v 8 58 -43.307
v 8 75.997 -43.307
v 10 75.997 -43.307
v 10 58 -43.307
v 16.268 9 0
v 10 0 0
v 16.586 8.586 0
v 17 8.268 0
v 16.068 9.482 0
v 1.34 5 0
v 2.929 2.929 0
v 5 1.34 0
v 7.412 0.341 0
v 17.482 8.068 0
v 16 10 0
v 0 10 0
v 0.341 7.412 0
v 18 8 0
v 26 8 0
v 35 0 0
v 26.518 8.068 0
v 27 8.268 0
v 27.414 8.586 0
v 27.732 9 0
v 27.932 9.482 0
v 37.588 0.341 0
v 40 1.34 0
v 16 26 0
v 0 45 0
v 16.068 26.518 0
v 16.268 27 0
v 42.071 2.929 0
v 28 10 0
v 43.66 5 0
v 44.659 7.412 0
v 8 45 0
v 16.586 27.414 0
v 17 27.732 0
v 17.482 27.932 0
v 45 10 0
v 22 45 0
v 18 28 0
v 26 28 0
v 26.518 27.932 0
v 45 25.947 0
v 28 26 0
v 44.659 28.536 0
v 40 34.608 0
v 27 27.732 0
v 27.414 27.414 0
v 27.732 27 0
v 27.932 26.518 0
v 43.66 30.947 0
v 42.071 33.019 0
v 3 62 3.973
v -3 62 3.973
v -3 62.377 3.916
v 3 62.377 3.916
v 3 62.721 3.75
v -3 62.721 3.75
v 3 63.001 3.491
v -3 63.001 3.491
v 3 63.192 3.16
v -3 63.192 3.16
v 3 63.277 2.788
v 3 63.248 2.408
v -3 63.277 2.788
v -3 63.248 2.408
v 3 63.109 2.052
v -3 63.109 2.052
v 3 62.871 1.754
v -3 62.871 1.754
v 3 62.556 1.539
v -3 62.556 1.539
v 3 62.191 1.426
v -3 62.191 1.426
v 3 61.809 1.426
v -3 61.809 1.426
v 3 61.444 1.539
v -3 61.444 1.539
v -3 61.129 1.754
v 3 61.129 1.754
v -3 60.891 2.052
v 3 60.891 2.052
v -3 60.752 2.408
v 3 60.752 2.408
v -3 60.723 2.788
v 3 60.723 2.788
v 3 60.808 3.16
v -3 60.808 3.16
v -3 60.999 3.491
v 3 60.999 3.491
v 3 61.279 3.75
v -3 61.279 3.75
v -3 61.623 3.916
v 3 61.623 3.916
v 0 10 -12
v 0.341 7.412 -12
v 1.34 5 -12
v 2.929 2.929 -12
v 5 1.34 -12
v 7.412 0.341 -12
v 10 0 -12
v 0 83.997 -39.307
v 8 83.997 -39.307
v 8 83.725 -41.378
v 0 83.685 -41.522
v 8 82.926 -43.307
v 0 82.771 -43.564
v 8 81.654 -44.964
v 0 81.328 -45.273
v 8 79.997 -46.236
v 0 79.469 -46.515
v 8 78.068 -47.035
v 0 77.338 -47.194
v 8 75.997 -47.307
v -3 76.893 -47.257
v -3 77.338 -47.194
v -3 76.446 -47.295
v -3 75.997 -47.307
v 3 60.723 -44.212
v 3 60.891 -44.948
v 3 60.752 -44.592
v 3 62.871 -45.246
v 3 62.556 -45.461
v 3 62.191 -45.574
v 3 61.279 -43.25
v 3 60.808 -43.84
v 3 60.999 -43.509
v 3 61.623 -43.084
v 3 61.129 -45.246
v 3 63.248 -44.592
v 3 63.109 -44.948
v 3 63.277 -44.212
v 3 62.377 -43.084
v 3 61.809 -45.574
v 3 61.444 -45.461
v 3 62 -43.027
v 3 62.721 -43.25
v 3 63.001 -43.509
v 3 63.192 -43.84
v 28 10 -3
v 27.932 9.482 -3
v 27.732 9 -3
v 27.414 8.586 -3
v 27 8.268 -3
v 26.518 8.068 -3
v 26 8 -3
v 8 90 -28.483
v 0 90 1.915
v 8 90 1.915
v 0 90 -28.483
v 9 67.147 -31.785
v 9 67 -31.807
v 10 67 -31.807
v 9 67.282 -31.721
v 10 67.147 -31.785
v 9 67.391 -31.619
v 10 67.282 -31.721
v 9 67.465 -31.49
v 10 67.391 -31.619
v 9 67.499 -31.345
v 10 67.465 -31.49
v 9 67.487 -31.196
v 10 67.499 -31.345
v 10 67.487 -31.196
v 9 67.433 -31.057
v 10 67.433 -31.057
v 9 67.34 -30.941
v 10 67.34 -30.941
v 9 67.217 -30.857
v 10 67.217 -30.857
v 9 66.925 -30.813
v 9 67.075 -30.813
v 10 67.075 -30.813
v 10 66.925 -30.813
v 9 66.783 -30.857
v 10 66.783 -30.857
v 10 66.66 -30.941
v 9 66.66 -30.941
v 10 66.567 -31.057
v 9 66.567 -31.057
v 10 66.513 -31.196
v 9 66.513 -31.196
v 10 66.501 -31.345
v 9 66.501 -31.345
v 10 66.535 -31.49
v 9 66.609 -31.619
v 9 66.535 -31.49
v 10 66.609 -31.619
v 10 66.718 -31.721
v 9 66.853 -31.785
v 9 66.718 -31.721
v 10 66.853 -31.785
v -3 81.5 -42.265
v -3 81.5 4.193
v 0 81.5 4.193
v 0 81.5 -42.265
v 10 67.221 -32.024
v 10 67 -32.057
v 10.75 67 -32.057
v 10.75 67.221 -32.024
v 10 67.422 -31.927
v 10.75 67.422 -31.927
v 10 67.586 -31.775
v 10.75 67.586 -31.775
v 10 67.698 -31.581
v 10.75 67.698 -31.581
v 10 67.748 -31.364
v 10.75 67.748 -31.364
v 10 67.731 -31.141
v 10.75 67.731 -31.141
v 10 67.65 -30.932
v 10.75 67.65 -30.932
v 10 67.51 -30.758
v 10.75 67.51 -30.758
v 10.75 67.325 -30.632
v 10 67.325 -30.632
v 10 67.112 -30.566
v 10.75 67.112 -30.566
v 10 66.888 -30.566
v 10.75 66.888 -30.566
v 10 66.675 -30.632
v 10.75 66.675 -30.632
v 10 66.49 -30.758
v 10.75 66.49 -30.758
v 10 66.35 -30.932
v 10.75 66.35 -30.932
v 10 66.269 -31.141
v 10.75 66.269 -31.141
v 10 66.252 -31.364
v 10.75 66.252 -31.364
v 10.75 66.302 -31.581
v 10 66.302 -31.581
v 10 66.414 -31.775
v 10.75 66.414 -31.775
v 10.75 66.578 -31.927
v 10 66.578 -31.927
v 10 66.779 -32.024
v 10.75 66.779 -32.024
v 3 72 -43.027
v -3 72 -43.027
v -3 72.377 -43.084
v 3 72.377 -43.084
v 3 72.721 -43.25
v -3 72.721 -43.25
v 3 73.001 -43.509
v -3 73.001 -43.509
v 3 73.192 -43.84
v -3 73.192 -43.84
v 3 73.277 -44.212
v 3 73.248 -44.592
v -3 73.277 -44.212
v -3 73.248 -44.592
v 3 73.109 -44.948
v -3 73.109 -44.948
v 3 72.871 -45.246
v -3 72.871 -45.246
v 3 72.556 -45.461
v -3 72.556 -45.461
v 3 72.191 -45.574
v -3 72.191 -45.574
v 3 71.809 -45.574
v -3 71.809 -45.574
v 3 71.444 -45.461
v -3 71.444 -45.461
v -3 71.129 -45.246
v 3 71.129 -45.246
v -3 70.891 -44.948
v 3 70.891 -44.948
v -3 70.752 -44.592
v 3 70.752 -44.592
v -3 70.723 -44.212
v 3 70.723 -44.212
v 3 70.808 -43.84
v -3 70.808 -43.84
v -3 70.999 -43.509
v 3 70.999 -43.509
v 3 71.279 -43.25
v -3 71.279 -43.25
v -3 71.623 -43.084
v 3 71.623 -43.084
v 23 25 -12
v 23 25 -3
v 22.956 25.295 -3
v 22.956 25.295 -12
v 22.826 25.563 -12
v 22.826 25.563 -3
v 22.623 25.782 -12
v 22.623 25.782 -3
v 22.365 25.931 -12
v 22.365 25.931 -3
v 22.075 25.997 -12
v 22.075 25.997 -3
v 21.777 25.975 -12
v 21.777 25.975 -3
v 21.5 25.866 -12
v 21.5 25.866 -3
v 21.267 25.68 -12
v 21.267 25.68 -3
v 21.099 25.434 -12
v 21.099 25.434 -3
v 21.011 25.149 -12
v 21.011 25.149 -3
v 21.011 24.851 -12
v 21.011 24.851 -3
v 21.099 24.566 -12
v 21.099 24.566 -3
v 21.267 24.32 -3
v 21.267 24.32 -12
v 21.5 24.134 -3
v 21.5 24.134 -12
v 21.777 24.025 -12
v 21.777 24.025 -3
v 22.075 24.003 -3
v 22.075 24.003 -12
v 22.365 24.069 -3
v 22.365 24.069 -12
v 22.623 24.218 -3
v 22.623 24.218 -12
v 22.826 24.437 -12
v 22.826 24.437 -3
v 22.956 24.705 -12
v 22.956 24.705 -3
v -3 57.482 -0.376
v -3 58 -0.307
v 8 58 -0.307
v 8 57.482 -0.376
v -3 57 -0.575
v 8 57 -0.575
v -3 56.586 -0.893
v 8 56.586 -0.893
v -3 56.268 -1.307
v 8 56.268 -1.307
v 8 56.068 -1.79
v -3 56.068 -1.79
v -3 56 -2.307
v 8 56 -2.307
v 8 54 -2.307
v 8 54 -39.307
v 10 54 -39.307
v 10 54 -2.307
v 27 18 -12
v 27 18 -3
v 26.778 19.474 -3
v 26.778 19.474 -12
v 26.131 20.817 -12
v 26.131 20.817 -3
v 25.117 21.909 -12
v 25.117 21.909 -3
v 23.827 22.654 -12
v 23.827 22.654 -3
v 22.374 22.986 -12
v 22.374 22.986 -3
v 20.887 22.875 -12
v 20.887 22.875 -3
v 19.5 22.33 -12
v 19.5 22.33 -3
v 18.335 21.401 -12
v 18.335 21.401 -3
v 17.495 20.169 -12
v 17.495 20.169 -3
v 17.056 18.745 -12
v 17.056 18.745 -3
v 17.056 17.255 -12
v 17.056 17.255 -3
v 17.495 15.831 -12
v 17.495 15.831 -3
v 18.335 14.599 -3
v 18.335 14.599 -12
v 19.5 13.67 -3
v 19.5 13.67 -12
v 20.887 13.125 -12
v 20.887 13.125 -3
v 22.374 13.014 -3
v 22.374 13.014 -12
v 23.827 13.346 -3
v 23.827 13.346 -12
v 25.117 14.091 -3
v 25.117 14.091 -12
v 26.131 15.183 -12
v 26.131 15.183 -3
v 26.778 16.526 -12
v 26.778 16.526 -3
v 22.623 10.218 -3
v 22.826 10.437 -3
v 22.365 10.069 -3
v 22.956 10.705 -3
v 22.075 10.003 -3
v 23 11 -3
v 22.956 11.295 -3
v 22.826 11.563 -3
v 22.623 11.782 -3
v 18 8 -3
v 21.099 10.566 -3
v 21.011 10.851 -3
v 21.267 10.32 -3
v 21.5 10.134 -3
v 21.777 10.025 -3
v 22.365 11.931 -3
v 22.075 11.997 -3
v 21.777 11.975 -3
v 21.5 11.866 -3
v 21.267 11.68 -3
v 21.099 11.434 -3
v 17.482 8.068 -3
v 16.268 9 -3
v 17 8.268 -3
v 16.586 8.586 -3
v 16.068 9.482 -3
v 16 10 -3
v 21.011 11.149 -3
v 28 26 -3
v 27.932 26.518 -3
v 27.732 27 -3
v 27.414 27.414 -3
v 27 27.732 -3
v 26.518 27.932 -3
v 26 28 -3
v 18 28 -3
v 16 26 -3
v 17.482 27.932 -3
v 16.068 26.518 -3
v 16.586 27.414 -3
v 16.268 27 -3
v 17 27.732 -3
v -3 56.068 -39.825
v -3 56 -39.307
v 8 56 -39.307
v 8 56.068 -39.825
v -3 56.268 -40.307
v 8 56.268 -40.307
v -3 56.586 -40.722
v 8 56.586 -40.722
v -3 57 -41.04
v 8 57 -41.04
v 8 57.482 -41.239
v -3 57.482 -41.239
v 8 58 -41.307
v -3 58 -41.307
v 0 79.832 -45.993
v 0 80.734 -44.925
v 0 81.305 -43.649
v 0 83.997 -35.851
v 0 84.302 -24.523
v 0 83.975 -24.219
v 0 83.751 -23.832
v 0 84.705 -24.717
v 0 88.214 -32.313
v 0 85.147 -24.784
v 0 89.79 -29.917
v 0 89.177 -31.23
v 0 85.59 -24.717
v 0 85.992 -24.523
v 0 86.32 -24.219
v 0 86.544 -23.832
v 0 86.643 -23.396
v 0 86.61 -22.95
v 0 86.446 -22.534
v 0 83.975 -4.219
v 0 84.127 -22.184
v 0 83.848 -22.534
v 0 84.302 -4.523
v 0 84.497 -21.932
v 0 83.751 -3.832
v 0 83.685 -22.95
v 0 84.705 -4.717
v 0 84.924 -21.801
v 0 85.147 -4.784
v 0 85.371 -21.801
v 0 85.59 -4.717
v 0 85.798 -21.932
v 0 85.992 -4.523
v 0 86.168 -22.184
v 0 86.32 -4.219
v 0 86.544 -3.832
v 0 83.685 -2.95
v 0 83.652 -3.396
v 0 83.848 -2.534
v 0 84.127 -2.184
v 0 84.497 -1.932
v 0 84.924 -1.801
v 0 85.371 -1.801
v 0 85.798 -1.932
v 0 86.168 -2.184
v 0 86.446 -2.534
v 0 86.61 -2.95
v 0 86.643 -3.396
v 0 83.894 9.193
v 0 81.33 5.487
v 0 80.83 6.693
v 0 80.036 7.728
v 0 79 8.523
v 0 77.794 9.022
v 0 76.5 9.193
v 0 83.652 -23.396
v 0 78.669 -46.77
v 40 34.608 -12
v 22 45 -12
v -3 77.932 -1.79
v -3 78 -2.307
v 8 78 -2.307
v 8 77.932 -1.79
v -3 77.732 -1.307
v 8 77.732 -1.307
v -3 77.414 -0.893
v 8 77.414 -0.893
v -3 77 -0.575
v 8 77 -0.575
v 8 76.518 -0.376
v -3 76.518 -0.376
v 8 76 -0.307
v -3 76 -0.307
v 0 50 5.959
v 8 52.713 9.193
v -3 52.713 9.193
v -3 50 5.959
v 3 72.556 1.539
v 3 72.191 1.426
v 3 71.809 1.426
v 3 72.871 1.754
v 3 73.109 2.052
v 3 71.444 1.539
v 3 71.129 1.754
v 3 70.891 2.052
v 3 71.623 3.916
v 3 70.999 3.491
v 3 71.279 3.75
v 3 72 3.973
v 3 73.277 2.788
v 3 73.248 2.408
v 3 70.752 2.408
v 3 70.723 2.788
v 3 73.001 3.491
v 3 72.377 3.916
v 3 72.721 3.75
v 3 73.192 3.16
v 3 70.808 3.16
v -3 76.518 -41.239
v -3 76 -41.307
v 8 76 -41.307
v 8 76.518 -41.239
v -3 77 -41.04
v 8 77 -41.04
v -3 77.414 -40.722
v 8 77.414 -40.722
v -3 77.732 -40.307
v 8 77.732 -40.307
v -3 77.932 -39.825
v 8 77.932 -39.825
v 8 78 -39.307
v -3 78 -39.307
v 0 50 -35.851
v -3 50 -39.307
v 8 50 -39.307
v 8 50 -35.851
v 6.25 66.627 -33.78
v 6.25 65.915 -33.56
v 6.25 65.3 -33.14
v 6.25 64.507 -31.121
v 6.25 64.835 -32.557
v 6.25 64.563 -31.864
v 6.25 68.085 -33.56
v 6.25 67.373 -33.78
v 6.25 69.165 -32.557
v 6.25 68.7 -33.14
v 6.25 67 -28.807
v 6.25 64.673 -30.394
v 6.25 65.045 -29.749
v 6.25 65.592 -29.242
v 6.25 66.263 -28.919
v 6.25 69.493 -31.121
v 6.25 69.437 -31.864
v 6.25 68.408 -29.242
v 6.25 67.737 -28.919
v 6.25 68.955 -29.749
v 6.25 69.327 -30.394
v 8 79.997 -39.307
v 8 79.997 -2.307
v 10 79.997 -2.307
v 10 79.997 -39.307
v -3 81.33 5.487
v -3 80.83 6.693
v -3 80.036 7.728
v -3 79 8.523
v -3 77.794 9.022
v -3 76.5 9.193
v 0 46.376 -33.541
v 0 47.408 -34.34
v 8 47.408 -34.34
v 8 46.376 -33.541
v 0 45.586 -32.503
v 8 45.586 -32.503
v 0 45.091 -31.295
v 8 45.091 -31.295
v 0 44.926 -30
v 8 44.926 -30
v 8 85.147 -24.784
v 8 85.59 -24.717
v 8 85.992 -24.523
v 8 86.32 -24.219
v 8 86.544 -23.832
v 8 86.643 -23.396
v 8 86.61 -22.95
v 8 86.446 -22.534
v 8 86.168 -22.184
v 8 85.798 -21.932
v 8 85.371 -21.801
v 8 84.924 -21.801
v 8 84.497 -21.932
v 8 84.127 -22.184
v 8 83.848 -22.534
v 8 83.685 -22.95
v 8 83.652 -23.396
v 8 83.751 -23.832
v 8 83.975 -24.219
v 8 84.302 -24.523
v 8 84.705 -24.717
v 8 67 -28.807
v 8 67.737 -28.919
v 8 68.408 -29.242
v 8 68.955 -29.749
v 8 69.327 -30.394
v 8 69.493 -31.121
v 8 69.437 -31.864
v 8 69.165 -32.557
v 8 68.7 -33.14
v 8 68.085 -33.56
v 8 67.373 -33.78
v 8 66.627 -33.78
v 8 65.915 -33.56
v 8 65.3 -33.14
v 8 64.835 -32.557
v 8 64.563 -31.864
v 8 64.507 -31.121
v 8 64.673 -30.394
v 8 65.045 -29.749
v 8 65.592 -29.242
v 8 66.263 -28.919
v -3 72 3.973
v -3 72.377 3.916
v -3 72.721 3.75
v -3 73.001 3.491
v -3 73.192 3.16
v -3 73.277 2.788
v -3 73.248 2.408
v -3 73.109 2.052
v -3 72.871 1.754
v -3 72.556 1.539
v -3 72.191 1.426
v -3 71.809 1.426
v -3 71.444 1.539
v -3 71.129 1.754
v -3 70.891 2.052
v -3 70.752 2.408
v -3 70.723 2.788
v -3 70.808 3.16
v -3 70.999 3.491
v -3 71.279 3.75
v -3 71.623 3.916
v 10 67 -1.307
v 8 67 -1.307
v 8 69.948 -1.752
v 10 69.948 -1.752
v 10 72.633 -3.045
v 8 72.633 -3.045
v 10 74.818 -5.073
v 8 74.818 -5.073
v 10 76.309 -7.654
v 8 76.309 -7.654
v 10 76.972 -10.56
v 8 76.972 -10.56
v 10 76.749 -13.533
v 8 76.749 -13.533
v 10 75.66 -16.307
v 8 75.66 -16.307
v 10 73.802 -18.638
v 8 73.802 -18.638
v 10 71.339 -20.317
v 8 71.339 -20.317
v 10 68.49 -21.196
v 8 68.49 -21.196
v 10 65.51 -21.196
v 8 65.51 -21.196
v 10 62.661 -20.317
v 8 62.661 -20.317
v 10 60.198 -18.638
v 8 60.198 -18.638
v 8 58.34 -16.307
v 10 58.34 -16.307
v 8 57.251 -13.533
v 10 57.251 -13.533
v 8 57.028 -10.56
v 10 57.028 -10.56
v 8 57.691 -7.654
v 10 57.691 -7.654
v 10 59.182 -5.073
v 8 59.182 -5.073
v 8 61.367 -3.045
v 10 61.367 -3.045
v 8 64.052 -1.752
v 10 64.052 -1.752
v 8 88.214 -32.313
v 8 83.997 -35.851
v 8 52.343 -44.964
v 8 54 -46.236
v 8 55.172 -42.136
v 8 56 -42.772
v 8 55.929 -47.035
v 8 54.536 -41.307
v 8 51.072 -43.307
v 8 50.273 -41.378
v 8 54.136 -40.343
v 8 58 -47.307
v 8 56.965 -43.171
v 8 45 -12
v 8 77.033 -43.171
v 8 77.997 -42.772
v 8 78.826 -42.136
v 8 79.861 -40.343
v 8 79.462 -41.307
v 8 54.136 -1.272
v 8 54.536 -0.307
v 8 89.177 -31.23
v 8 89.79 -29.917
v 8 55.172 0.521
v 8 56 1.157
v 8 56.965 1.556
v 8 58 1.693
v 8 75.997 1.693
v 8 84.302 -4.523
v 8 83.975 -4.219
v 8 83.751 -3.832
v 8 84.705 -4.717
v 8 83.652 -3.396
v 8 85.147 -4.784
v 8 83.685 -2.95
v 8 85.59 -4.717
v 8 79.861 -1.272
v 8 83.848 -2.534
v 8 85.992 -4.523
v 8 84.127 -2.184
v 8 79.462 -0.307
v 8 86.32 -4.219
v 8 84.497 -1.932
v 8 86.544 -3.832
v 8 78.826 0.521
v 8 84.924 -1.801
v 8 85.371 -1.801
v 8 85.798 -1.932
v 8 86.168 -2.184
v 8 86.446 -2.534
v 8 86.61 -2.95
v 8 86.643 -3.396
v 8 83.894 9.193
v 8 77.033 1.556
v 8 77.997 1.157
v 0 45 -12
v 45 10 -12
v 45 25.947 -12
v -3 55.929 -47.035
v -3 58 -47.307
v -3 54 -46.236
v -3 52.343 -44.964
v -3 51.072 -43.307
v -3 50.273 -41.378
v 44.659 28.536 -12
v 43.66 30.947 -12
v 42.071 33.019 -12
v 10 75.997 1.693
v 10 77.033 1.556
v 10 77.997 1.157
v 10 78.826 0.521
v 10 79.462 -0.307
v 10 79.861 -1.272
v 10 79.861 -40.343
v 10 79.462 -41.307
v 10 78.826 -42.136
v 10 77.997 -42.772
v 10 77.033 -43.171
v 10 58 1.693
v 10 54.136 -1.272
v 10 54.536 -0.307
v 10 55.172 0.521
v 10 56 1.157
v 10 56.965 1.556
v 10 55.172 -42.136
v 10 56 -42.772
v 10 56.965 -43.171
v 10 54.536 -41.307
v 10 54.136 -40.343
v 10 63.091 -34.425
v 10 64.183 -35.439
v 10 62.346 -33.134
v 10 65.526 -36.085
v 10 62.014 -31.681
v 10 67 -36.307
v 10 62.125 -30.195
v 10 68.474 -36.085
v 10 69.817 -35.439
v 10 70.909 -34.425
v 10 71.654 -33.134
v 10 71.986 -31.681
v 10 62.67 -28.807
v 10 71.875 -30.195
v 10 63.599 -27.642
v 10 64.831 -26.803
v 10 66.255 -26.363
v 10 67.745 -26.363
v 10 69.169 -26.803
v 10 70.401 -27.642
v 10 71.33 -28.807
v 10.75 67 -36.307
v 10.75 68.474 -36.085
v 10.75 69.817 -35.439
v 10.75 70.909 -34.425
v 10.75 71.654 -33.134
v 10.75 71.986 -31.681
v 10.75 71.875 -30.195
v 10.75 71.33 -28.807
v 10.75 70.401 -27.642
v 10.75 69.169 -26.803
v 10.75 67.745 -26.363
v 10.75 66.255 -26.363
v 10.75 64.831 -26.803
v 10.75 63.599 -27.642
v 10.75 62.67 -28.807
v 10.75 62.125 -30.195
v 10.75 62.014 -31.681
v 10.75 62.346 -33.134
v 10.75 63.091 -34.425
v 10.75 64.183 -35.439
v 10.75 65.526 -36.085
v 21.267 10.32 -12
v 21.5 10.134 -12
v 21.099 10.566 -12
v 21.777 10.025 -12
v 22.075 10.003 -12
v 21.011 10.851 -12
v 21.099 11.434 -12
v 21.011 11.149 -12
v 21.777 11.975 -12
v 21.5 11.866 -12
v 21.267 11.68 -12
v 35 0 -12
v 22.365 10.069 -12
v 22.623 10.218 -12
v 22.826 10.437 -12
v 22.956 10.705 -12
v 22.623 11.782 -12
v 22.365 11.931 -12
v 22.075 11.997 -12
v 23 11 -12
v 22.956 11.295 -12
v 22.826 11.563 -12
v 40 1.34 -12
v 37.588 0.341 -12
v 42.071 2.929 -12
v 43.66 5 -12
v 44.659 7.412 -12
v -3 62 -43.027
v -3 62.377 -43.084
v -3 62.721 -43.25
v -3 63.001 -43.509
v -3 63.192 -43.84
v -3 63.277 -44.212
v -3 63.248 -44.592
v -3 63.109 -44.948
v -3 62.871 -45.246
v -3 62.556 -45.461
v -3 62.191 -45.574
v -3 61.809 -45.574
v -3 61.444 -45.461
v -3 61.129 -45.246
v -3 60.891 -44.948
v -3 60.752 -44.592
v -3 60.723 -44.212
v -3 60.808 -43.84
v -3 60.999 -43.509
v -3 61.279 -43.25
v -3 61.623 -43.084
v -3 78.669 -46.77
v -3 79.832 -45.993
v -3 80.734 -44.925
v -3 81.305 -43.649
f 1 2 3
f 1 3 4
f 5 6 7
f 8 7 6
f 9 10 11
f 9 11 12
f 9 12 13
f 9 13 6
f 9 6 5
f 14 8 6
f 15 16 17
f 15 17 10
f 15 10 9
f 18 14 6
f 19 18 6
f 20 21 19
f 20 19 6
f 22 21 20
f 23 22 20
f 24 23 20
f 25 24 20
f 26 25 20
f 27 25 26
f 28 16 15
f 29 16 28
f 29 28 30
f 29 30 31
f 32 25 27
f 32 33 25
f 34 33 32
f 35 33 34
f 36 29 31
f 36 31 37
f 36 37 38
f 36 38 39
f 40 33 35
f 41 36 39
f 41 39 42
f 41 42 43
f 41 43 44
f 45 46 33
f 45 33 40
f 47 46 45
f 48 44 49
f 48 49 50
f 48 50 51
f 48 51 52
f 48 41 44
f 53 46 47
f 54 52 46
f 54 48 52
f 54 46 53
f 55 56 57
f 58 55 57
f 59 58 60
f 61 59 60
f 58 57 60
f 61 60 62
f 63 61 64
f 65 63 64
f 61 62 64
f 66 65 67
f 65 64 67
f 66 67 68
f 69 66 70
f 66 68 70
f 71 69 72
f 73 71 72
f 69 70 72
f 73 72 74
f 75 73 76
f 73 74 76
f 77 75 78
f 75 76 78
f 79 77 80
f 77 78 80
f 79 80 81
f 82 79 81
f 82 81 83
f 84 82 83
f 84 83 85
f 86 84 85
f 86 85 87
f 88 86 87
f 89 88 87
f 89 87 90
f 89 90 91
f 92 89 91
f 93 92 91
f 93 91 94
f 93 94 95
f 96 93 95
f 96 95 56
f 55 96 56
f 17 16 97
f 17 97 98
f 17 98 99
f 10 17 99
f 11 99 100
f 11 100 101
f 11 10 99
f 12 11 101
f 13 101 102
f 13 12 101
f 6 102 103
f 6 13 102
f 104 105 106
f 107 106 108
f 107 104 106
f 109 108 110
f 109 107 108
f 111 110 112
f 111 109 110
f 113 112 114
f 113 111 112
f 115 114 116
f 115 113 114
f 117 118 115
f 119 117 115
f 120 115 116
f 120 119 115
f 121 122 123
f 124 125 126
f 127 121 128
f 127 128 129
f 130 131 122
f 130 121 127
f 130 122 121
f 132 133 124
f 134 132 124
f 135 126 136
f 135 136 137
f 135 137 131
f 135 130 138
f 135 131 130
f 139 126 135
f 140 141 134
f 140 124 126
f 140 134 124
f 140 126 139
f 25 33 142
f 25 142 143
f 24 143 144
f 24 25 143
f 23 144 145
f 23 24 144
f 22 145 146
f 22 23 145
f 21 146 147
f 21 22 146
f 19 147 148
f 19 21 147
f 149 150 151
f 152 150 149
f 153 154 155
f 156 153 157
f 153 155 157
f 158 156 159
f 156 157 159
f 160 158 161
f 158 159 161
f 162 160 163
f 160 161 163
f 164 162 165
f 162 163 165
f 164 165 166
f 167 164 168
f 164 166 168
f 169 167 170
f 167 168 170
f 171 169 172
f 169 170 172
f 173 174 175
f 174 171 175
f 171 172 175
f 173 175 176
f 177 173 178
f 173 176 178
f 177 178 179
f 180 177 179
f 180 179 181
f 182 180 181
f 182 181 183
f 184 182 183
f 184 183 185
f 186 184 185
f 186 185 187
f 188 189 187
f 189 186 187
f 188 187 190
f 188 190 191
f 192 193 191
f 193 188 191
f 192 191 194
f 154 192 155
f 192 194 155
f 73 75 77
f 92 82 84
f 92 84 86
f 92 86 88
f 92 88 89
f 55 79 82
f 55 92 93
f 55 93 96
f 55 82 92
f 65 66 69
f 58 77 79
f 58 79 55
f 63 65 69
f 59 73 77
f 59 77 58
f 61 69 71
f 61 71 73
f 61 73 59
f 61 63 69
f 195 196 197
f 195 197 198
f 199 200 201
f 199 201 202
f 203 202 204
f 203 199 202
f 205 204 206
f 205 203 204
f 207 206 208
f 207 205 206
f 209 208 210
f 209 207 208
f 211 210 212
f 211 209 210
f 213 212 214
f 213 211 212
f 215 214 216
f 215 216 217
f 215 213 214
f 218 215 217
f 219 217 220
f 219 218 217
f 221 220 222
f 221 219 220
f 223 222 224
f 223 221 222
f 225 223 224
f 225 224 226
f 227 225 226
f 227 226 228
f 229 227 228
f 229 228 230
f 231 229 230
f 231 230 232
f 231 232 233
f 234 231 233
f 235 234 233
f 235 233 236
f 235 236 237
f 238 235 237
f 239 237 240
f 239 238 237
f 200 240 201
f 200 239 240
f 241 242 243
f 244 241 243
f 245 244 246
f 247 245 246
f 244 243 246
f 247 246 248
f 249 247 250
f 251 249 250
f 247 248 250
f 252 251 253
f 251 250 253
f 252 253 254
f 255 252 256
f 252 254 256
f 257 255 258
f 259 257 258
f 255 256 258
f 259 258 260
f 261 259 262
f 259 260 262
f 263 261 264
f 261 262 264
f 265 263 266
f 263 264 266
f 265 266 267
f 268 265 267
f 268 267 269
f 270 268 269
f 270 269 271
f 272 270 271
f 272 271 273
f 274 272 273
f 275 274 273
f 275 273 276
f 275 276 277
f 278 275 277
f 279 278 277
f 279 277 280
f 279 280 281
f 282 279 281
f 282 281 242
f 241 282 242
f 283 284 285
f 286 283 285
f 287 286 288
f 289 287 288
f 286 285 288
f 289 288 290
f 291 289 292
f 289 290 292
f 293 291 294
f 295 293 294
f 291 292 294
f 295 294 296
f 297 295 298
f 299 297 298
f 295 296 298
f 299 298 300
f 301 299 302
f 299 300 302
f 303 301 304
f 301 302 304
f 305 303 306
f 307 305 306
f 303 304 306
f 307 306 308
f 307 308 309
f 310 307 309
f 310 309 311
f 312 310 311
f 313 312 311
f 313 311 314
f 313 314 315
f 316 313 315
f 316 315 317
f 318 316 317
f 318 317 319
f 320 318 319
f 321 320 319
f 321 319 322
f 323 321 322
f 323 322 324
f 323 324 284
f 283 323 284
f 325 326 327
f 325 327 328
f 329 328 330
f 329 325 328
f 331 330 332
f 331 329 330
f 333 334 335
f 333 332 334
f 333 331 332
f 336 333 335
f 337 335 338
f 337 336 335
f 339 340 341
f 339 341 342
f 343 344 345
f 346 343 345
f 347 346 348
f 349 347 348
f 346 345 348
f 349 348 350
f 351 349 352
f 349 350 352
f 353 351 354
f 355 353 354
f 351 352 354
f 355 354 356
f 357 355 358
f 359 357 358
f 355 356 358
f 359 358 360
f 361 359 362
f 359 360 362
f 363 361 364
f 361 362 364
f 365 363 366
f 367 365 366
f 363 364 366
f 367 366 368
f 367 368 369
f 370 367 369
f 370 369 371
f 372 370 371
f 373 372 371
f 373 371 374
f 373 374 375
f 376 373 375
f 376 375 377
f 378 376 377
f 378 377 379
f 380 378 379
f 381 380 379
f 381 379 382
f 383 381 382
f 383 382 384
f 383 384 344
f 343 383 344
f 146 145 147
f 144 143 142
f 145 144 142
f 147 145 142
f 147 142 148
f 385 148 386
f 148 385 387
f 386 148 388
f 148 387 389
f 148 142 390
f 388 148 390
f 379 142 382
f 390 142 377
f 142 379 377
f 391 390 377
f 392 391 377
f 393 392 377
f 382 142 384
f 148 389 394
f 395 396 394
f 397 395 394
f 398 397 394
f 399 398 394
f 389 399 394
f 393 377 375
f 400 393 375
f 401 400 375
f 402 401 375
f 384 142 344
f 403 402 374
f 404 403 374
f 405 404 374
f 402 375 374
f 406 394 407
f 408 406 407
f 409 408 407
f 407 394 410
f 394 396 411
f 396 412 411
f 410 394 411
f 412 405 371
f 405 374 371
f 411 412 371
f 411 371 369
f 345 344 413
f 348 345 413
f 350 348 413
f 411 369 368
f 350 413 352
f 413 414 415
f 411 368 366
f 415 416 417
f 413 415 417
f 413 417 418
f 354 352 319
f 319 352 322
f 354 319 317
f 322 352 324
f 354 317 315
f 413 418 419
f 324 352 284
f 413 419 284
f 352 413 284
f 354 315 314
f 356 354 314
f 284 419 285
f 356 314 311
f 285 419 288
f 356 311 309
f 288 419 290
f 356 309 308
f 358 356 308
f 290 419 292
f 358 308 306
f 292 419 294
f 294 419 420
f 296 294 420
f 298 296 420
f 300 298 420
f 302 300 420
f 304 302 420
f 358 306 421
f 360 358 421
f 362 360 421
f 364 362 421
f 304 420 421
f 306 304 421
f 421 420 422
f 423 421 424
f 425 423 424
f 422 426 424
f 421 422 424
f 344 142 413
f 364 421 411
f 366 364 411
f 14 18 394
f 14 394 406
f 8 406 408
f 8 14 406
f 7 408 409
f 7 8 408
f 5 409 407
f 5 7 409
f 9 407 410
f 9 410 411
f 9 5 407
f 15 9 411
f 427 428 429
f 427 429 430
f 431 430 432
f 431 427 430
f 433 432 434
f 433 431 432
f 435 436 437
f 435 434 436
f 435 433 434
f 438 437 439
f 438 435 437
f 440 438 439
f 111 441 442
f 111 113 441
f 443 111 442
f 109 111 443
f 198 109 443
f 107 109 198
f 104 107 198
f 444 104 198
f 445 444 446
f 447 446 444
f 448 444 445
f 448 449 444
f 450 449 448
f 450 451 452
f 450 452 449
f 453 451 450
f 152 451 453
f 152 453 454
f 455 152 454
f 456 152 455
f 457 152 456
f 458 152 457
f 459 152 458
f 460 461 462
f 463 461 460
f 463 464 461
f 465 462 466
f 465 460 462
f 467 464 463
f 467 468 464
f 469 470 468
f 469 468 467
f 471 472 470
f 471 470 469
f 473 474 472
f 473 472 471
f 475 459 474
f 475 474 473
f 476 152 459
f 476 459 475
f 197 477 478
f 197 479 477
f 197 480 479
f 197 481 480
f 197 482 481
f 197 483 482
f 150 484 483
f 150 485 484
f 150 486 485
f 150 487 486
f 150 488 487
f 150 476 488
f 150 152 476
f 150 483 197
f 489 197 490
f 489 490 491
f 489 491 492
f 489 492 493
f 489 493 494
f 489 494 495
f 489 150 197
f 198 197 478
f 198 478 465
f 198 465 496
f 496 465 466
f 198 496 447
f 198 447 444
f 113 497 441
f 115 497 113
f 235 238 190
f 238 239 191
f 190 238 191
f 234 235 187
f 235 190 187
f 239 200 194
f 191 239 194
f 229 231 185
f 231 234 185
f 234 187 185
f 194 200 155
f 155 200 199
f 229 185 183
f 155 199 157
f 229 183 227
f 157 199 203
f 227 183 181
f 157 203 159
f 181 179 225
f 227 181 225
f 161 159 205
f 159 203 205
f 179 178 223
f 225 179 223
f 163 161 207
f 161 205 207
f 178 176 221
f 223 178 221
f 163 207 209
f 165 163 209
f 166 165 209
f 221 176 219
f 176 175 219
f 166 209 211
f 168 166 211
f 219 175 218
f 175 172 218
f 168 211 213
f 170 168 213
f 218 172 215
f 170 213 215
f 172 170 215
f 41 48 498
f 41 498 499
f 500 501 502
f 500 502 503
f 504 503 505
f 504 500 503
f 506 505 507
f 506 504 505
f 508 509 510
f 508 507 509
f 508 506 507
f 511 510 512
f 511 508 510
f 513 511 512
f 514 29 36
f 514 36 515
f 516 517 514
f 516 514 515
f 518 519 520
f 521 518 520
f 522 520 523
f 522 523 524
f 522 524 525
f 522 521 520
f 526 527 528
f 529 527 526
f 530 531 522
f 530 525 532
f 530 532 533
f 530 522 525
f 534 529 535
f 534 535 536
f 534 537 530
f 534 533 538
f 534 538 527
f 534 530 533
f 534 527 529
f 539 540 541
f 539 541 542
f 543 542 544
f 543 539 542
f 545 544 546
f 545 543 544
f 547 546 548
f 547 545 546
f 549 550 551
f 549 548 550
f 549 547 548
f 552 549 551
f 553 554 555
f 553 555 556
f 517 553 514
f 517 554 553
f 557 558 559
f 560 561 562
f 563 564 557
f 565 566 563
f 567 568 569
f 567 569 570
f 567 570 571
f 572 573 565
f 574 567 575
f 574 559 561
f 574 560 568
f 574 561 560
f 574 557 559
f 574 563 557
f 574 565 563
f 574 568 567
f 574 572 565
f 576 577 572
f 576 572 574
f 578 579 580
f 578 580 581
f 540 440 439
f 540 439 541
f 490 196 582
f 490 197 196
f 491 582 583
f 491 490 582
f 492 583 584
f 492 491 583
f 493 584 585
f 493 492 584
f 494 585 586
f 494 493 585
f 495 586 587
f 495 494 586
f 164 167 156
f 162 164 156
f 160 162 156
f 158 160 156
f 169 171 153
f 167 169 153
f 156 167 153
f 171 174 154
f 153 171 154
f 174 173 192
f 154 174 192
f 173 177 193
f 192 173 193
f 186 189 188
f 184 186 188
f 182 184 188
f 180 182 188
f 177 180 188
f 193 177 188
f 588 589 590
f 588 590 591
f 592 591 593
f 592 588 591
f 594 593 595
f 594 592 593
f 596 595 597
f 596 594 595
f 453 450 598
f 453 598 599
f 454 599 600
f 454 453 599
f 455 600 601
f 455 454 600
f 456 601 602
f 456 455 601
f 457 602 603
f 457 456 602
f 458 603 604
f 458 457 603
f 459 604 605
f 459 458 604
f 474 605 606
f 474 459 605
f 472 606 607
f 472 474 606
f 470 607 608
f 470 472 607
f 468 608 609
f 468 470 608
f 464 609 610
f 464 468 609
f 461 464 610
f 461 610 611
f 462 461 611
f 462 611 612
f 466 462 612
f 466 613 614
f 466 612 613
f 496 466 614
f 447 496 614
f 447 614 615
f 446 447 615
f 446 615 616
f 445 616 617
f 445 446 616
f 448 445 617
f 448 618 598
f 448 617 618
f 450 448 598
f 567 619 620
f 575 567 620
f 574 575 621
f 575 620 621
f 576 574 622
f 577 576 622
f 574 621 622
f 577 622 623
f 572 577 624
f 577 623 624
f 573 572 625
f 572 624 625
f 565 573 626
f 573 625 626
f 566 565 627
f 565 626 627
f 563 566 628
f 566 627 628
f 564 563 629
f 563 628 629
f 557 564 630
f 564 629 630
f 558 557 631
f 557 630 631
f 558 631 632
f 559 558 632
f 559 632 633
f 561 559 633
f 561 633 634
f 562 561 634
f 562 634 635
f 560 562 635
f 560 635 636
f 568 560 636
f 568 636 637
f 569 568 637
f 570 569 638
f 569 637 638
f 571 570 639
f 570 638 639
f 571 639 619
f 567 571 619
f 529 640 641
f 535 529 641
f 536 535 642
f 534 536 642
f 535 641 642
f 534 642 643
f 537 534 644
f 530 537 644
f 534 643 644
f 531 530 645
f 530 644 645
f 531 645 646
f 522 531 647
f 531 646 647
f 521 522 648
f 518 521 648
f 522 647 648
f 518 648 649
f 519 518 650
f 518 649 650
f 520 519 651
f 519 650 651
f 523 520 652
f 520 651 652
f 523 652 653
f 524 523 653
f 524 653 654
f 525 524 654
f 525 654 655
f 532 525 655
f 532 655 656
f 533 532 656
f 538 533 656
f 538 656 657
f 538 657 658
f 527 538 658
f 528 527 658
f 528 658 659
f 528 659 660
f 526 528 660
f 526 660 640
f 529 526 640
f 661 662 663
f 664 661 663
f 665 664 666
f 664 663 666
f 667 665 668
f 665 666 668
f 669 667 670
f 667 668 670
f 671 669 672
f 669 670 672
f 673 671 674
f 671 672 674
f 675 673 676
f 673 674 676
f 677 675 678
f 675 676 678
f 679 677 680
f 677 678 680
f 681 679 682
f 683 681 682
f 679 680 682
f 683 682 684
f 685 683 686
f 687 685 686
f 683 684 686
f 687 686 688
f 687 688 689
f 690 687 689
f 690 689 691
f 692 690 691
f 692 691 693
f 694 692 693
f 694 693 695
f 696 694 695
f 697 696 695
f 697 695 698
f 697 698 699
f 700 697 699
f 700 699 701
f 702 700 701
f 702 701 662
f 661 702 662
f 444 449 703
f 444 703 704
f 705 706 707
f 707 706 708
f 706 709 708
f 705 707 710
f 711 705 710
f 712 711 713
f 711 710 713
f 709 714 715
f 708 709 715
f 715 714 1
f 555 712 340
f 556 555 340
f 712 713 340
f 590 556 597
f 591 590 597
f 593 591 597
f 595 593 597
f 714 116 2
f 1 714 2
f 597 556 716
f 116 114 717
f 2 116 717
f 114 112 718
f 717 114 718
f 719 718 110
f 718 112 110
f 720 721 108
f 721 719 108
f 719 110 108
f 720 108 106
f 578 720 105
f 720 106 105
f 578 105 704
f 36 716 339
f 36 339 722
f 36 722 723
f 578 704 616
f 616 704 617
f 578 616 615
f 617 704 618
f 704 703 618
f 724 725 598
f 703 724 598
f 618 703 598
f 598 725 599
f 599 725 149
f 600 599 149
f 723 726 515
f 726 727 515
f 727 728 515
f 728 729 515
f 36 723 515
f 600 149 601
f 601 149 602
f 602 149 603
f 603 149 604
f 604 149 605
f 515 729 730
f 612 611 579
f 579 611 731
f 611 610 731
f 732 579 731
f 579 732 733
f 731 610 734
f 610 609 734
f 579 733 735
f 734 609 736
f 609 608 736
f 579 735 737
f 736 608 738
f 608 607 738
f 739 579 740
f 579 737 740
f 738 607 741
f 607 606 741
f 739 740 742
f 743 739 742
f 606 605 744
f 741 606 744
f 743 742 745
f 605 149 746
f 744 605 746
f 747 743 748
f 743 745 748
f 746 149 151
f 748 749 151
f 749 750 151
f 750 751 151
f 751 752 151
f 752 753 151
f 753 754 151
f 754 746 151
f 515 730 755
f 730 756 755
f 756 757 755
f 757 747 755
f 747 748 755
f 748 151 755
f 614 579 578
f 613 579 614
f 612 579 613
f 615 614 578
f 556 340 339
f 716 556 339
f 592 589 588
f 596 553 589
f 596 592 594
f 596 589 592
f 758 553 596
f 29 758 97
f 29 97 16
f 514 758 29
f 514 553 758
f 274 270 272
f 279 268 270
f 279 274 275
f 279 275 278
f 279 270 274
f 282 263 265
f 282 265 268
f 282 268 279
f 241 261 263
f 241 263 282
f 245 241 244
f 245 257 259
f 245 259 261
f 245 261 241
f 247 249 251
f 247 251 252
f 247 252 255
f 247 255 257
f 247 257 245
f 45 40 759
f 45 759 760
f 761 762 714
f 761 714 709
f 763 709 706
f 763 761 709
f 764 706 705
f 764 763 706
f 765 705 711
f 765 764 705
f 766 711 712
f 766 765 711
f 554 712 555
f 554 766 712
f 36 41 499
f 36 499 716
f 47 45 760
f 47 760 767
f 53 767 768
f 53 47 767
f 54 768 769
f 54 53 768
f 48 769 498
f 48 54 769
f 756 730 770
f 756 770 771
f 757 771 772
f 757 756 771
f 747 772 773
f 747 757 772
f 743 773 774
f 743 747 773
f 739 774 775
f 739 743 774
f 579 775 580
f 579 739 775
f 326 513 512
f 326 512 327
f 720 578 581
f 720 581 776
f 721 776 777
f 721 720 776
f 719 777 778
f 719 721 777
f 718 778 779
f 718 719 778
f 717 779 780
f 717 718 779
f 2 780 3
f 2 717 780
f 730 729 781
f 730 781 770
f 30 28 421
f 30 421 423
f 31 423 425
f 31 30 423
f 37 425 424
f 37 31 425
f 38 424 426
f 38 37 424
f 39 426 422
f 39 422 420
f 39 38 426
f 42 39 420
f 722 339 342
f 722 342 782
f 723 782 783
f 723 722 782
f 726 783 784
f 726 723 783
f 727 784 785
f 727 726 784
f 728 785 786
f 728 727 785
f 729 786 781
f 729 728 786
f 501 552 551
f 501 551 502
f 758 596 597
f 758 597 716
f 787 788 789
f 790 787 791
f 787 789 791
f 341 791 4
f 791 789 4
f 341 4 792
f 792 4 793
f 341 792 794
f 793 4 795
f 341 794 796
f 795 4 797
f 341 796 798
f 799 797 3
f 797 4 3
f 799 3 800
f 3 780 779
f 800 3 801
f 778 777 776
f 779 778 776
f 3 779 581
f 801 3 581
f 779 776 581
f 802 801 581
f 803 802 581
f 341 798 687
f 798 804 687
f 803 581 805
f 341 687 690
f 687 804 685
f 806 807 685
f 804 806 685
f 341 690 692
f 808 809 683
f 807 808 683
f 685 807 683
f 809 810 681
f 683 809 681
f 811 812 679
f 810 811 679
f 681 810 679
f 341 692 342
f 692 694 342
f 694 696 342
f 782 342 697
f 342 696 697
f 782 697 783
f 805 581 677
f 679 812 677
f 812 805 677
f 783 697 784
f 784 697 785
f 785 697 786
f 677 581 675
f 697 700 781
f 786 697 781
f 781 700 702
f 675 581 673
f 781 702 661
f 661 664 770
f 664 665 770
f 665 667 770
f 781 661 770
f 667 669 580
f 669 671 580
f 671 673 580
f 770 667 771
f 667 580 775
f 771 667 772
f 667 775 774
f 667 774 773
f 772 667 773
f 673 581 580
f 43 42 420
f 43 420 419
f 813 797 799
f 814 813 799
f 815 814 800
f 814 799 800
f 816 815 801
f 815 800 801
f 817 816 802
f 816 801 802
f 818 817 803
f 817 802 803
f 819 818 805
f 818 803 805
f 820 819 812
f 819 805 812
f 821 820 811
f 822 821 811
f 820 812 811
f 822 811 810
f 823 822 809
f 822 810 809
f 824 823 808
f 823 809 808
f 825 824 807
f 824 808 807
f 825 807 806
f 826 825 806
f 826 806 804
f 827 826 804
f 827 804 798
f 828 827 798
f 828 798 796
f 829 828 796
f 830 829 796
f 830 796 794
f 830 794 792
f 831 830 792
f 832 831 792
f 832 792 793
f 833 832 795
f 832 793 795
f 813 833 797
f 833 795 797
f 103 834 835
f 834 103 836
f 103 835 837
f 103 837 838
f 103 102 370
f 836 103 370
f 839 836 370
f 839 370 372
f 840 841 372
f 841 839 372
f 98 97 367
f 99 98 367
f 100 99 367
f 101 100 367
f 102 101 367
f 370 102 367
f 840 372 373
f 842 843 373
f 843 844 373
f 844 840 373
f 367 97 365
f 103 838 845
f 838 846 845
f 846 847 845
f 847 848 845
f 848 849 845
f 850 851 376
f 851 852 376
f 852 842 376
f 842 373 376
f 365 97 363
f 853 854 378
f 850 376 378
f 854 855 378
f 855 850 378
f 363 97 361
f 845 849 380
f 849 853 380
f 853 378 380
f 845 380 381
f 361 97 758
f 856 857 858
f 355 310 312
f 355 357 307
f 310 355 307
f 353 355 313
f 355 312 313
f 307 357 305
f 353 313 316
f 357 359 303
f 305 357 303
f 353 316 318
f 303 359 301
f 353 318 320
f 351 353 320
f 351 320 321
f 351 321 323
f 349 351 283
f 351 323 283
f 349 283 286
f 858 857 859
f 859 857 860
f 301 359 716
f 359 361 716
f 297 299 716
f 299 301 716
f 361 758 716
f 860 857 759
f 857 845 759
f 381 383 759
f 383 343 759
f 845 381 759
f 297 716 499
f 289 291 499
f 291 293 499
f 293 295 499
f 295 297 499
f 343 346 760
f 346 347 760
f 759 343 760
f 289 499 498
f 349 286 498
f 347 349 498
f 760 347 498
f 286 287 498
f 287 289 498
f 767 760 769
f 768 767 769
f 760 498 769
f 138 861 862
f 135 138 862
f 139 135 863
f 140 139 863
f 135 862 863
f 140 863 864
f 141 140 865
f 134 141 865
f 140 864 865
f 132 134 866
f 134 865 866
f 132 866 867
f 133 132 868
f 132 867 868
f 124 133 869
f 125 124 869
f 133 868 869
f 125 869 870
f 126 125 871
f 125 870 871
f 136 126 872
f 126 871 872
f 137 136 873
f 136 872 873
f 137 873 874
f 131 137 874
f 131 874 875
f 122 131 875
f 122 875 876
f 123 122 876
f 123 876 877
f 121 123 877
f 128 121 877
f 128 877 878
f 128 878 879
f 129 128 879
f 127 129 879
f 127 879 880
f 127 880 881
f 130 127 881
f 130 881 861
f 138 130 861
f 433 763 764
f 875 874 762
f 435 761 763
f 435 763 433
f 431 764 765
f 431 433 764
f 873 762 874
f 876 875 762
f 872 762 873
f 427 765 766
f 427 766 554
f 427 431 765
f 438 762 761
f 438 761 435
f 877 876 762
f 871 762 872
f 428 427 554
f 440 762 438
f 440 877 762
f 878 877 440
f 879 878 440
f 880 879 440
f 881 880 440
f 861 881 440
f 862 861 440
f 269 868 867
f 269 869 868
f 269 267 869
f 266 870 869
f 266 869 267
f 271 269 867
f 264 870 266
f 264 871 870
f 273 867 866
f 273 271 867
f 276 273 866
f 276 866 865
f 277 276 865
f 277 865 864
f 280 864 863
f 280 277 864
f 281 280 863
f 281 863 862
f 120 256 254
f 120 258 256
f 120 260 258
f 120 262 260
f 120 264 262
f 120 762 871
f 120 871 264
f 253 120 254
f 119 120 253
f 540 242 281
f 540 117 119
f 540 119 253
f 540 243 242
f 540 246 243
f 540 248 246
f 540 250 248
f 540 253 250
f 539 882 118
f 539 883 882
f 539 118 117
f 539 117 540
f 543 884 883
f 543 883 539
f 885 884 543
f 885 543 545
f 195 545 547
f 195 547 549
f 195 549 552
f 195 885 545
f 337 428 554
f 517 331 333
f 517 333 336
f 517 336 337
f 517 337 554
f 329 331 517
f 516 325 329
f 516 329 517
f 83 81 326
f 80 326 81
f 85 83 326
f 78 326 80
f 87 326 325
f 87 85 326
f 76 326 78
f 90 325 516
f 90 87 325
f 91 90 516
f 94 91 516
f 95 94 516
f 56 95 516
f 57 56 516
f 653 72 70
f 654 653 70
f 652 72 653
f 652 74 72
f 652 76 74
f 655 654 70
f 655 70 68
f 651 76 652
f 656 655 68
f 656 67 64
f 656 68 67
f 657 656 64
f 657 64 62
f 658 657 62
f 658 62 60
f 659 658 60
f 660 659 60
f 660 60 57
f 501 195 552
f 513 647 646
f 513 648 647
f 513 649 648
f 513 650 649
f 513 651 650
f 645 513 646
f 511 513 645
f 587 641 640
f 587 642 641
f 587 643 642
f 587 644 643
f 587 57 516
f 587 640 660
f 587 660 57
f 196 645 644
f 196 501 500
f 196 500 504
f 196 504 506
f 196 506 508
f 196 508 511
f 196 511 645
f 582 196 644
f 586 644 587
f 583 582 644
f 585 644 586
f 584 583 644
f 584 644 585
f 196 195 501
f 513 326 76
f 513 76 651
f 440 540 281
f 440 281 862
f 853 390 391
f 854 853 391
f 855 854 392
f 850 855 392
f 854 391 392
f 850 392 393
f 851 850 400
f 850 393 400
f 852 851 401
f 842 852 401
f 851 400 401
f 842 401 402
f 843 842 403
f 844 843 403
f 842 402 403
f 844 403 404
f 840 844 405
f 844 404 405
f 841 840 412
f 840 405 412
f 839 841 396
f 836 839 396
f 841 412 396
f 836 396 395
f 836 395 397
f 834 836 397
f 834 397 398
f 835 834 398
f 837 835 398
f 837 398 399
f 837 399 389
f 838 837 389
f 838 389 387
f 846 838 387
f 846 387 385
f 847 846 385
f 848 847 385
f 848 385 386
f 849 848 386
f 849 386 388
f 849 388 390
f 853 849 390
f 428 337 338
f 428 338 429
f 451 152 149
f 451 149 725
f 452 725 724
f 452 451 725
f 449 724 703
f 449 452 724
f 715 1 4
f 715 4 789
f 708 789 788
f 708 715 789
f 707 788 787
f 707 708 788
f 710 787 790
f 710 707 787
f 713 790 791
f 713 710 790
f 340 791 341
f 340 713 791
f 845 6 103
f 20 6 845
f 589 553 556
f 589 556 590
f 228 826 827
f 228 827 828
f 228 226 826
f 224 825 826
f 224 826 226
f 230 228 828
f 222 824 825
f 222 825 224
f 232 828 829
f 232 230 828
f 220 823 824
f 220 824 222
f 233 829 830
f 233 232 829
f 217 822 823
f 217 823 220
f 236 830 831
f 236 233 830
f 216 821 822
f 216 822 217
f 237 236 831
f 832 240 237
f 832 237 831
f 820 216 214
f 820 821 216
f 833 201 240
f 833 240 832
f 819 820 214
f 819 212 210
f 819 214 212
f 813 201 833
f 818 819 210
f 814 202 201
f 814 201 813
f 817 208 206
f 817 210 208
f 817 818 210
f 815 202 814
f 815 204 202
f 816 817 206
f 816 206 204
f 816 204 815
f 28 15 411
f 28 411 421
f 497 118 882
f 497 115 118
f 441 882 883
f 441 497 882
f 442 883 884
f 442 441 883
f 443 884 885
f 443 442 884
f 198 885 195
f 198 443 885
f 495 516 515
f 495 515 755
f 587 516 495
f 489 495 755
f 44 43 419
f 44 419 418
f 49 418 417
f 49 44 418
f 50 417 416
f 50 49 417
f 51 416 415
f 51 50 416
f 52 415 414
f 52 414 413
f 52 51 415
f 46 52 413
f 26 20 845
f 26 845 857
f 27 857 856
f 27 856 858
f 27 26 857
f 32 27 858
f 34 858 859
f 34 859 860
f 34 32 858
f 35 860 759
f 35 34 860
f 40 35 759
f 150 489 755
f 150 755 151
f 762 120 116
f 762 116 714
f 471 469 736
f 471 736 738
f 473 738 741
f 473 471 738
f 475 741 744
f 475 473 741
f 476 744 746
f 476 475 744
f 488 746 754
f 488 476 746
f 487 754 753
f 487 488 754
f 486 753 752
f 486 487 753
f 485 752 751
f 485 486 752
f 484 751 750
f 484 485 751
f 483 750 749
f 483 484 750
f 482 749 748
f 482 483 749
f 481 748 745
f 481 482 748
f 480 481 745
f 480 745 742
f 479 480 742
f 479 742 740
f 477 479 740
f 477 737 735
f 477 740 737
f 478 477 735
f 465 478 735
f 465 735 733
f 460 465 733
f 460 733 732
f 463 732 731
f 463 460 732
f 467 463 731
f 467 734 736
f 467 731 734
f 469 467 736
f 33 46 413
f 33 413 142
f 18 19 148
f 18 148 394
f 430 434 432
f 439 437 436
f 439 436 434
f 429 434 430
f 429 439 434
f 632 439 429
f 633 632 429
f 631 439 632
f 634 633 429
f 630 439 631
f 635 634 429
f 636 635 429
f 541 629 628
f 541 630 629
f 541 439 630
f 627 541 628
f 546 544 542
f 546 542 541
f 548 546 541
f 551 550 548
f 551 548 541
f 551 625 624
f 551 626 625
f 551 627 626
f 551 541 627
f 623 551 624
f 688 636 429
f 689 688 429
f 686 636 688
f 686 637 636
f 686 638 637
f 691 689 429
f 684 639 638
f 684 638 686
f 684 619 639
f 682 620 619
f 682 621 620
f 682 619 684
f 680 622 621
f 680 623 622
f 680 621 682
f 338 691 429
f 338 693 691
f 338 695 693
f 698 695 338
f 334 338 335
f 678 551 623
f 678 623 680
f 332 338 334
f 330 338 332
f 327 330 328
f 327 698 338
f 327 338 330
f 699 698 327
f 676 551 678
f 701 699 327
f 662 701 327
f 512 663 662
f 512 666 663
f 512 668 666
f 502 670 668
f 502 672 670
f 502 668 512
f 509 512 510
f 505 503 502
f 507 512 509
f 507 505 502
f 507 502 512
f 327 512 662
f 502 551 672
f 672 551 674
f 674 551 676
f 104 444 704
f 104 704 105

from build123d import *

# Parameters (mm, degrees)
BOSS_EXTRUDE1_DEPTH     = 12
SKETCH1_3_R             = 1.0000000000000018
SKETCH1_3_R_2           = 4.999999999999997
CUT_EXTRUDE1_DEPTH      = 3
SKETCH1_4_R             = 1.0000000000000018
SKETCH1_4_R_2           = 4.999999999999997
CUT_EXTRUDE2_DEPTH      = 65.76109943476871
BOSS_EXTRUDE2_DEPTH     = 8
BOSS_EXTRUDE3_DEPTH     = 10
CUT_EXTRUDE5_DEPTH      = 8
SKETCH3_7_R             = 10.000000000000016
CUT_EXTRUDE6_DEPTH      = 112.18901206469407
SKETCH7_R               = 1.2803794551692569
SKETCH7_R_2             = 1.2803794551692533
CUT_EXTRUDE7_DEPTH      = 3
CUT_EXTRUDE8_DEPTH      = 109.19887431911056
CUT_EXTRUDE8_DEPTH_BACK = 109.19887431911056
SKETCH9_R               = 1.5000000000000018
SKETCH9_R_2             = 1.5000000000000009
SKETCH12_R              = 0.49999999999999917
CUT_EXTRUDE9_DEPTH      = 10
SKETCH13_R              = 4.999999999999998
SKETCH13_R_2            = 0.7499999999999987
BOSS_EXTRUDE5_DEPTH     = 0.75
BOSS_EXTRUDE7_START     = 3
SKETCH14_R              = 1.2803794551692569
SKETCH14_R_2            = 1.2803794551692533
BOSS_EXTRUDE7_DEPTH     = 3
FILLET1_R               = 5
BOSS_EXTRUDE9_START     = -1
SKETCH16_R              = 0.49999999999999917
BOSS_EXTRUDE9_DEPTH     = 1
SKETCH17_R              = 2.499999999999999
BOSS_EXTRUDE10_DEPTH    = 1.75


with BuildPart() as part:
    # Sketch1 → Boss-Extrude1 (new body)
    with BuildSketch(Plane.XY):
        with BuildLine():
            Line((0, 45), (0, 10.00000000000007))
            ThreePointArc((0, 10.00000000000007), (2.9289321881345227, 2.9289321881345236), (10.000000000000071, 0))
            Line((10.000000000000071, 0), (34.99999999999999, 0))
            ThreePointArc((34.99999999999999, 0), (42.07106781186547, 2.9289321881345254), (45.00000000000001, 10))
            Line((45.00000000000001, 10), (45, 25.947441116742414))
            ThreePointArc((45, 25.947441116742414), (43.66025403784438, 30.947441116742425), (39.99999999999998, 34.60769515458682))
            Line((39.99999999999998, 34.60769515458682), (22.000000000000004, 45))
            Line((22.000000000000004, 45), (0, 45))
        make_face()
    extrude(amount=-BOSS_EXTRUDE1_DEPTH)

    # Sketch1<3> → Cut-Extrude1 (cut)
    # profile 1 of 4: a face of its own
    with BuildSketch(Plane.XY):
        with BuildLine():
            ThreePointArc((16, 25.999999999999996), (16.585786437626908, 27.414213562373092), (18.000000000000004, 27.999999999999996))
            Line((18.000000000000004, 27.999999999999996), (26.000000000000004, 27.999999999999996))
            ThreePointArc((26.000000000000004, 27.999999999999996), (27.4142135623731, 27.414213562373092), (28.000000000000007, 25.999999999999996))
            Line((28.000000000000007, 25.999999999999996), (28.000000000000007, 9.999999999999998))
            ThreePointArc((28.000000000000007, 9.999999999999998), (27.4142135623731, 8.585786437626904), (26.000000000000004, 7.999999999999998))
            Line((26.000000000000004, 7.999999999999998), (18.000000000000004, 7.999999999999998))
            ThreePointArc((18.000000000000004, 7.999999999999998), (16.585786437626908, 8.585786437626902), (16, 9.999999999999998))
            Line((16, 9.999999999999998), (16, 25.999999999999996))
        make_face()
        with Locations((22.000000000000004, 24.999999999999996)):
            Circle(SKETCH1_3_R, mode=Mode.SUBTRACT)
        with Locations((22.000000000000014, 11)):
            Circle(SKETCH1_3_R, mode=Mode.SUBTRACT)
    # profile 2 of 4: a face of its own
    with BuildSketch(Plane.XY):
        with Locations((22.000000000000004, 24.999999999999996)):
            Circle(SKETCH1_3_R)
    # profile 3 of 4: a face of its own
    with BuildSketch(Plane.XY):
        with Locations((22.000000000000014, 11)):
            Circle(SKETCH1_3_R)
    # profile 4 of 4: a face of its own
    with BuildSketch(Plane.XY):
        with Locations((22, 18)):
            Circle(SKETCH1_3_R_2)
    extrude(amount=-CUT_EXTRUDE1_DEPTH, mode=Mode.SUBTRACT)

    # Sketch1<4> → Cut-Extrude2 (cut, through all)
    with BuildSketch(Plane.XY):
        with Locations((22.000000000000004, 24.999999999999996)):
            Circle(SKETCH1_4_R)
        with Locations((22.000000000000014, 11)):
            Circle(SKETCH1_4_R)
        with Locations((22, 18)):
            Circle(SKETCH1_4_R_2)
    extrude(amount=-CUT_EXTRUDE2_DEPTH, mode=Mode.SUBTRACT)

    # Sketch3 → Boss-Extrude2 (add)
    with BuildSketch(Plane.ZY):
        with BuildLine():
            Line((0, 45), (9.192533317427756, 52.71345131623845))
            Line((9.192533317427756, 52.71345131623845), (9.192533317427753, 83.89351770797785))
            Line((9.192533317427753, 83.89351770797785), (1.9151111077974905, 90))
            Line((1.9151111077974914, 90), (-28.482631319534235, 90))
            ThreePointArc((-28.482631319534235, 90), (-30.595722628237752, 89.53153893518325), (-32.31285353512915, 88.21393804843267))
            Line((-32.31285353512915, 88.21393804843267), (-35.85089798717716, 83.99746086194635))
            Line((-35.85089798717716, 83.99746086194632), (-39.307466682572176, 83.99746086194632))
            ThreePointArc((-39.307466682572176, 83.99746086194632), (-44.9643209320646, 81.65431511143869), (-47.30746668257225, 75.99746086194627))
            Line((-47.30746668257224, 75.99746086194627), (-47.30746668257224, 57.99999999999996))
            ThreePointArc((-47.30746668257224, 57.99999999999996), (-44.96432093206462, 52.343145750507574), (-39.30746668257224, 49.99999999999996))
            Line((-39.30746668257224, 49.99999999999996), (-35.85089798717716, 49.99999999999996))
            Line((-35.85089798717716, 49.99999999999998), (-34.340222638150145, 47.408116516924004))
            ThreePointArc((-34.340222638150145, 47.408116516924004), (-32.50258227548949, 45.585533814191855), (-29.999847687039637, 44.92595107445804))
            Line((-29.999847687039637, 44.92595107445804), (-12, 45))
            Line((-12, 45), (0, 45))
        make_face()
        with BuildLine():
            ThreePointArc((-0.30746668257224474, 57.99999999999999), (-0.893253120199152, 56.585786437626886), (-2.3074666825722603, 55.99999999999998))
            Line((-2.3074666825722616, 55.99999999999998), (-39.307466682572226, 55.99999999999998))
            ThreePointArc((-39.307466682572226, 55.99999999999998), (-40.72168024494533, 56.585786437626886), (-41.30746668257224, 57.99999999999999))
            Line((-41.30746668257224, 57.99999999999999), (-41.30746668257225, 75.99999999999989))
            ThreePointArc((-41.30746668257225, 75.99999999999989), (-40.721680244945325, 77.41421356237302), (-39.30746668257219, 77.99999999999994))
            Line((-39.30746668257219, 77.99999999999994), (-2.307466682572233, 77.99999999999994))
            ThreePointArc((-2.307466682572236, 77.99999999999994), (-0.8932531201991549, 77.41421356237304), (-0.30746668257225007, 75.99999999999996))
            Line((-0.3074666825722463, 75.99999999999996), (-0.3074666825722459, 57.99999999999999))
        make_face(mode=Mode.SUBTRACT)
    extrude(amount=-BOSS_EXTRUDE2_DEPTH)

    # Sketch3<4> → Boss-Extrude3 (add)
    with BuildSketch(Plane.ZY):
        with BuildLine():
            Line((-43.307466682572255, 75.99746086194627), (-43.30746668257225, 57.99999999999996))
            ThreePointArc((-43.30746668257225, 57.99999999999996), (-42.13589380731844, 55.171572875253766), (-39.30746668257225, 53.99999999999995))
            Line((-39.30746668257225, 53.99999999999995), (-2.307466682572236, 53.99999999999995))
            ThreePointArc((-2.307466682572236, 53.99999999999995), (0.520960442173954, 55.17157287525376), (1.6925333174277633, 57.99999999999995))
            Line((1.6925333174277633, 57.99999999999995), (1.6925333174277606, 75.99746086194632))
            ThreePointArc((1.6925333174277606, 75.99746086194632), (0.5209604421739544, 78.8258879866925), (-2.307466682572236, 79.99746086194632))
            Line((-2.307466682572236, 79.99746086194632), (-39.30746668257218, 79.99746086194632))
            ThreePointArc((-39.30746668257218, 79.99746086194632), (-42.135893807318425, 78.8258879866925), (-43.307466682572255, 75.99746086194627))
        make_face()
    extrude(amount=-BOSS_EXTRUDE3_DEPTH)

    # Sketch3<6> → Cut-Extrude5 (cut)
    with BuildSketch(Plane.ZY):
        with BuildLine():
            Line((-41.30746668257225, 75.99999999999989), (-41.30746668257224, 57.99999999999999))
            ThreePointArc((-41.30746668257224, 57.99999999999999), (-40.72168024494533, 56.585786437626886), (-39.307466682572226, 55.99999999999998))
            Line((-39.307466682572226, 55.99999999999998), (-2.3074666825722603, 55.99999999999998))
            ThreePointArc((-2.3074666825722603, 55.99999999999998), (-0.8932531201991509, 56.585786437626886), (-0.3074666825722459, 57.99999999999999))
            Line((-0.3074666825722459, 57.99999999999999), (-0.3074666825722463, 75.99999999999996))
            ThreePointArc((-0.3074666825722463, 75.99999999999996), (-0.8932531201991507, 77.41421356237304), (-2.307466682572236, 77.99999999999994))
            Line((-2.307466682572236, 77.99999999999994), (-39.30746668257219, 77.99999999999994))
            ThreePointArc((-39.30746668257219, 77.99999999999994), (-40.721680244945325, 77.41421356237302), (-41.30746668257225, 75.99999999999989))
        make_face()
    extrude(amount=-CUT_EXTRUDE5_DEPTH, mode=Mode.SUBTRACT)

    # Sketch3<7> → Cut-Extrude6 (cut, through all)
    with BuildSketch(Plane.ZY):
        with Locations((-11.307466682572244, 66.99999999999991)):
            Circle(SKETCH3_7_R)
    extrude(amount=-CUT_EXTRUDE6_DEPTH, mode=Mode.SUBTRACT)

    # Sketch7 → Cut-Extrude7 (cut)
    with BuildSketch(Plane.ZY):
        with Locations((-44.30746668257226, 71.99999999999999)):
            Circle(SKETCH7_R)
        with Locations((-44.307466682572255, 61.99999999999998)):
            Circle(SKETCH7_R)
        with Locations((2.692533317427754, 61.99999999999998)):
            Circle(SKETCH7_R_2)
        with Locations((2.692533317427754, 71.99999999999999)):
            Circle(SKETCH7_R_2)
    extrude(amount=-CUT_EXTRUDE7_DEPTH, mode=Mode.SUBTRACT)

    # Sketch9 → Cut-Extrude8 (cut, two sides: drawn at the far end of the back side and taken through both)
    with BuildSketch(Plane(origin=(8, 0, 0), x_dir=(0, 0, -1), z_dir=(1, 0, 0)).offset(-CUT_EXTRUDE8_DEPTH_BACK)):
        with Locations((3.283760105868373, 85.14746086194633)):
            Circle(SKETCH9_R)
        with Locations((23.28376010586837, 85.14746086194633)):
            Circle(SKETCH9_R_2)
    extrude(amount=CUT_EXTRUDE8_DEPTH + CUT_EXTRUDE8_DEPTH_BACK, mode=Mode.SUBTRACT)

    # Sketch12 → Cut-Extrude9 (cut)
    with BuildSketch(Plane(origin=(10, 0, 0), x_dir=(0, 0, -1), z_dir=(1, 0, 0))):
        with Locations((31.30746668257224, 66.99999999999997)):
            Circle(SKETCH12_R)
    extrude(amount=-CUT_EXTRUDE9_DEPTH, mode=Mode.SUBTRACT)

    # Sketch13 → Boss-Extrude5 (add)
    with BuildSketch(Plane(origin=(10, 0, 0), x_dir=(0, 0, -1), z_dir=(1, 0, 0))):
        with Locations((31.30746668257224, 66.99999999999991)):
            Circle(SKETCH13_R)
        with Locations((31.30746668257224, 66.99999999999991)):
            Circle(SKETCH13_R_2, mode=Mode.SUBTRACT)
    extrude(amount=BOSS_EXTRUDE5_DEPTH)

    # Sketch14 → Boss-Extrude7 (add)
    with BuildSketch(Plane.ZY.offset(BOSS_EXTRUDE7_START)):
        with BuildLine():
            Line((-35.85089798717716, 49.99999999999997), (5.958767962971046, 49.99999999999997))
            Line((5.958767962971046, 49.99999999999997), (9.192533317427753, 52.71345131623845))
            Line((9.192533317427753, 52.71345131623845), (9.192533317427753, 81.49999999999994))
            Line((9.192533317427753, 81.49999999999994), (-45.11453677291794, 81.49999999999994))
            ThreePointArc((-45.11453677291794, 81.49999999999994), (-46.739039891616386, 78.95916976705784), (-47.30746668257223, 75.99746086194627))
            Line((-47.30746668257223, 75.99746086194627), (-47.30746668257224, 57.99999999999996))
            ThreePointArc((-47.30746668257224, 57.99999999999996), (-44.96432093206462, 52.343145750507574), (-39.30746668257224, 49.99999999999996))
            Line((-39.30746668257224, 49.99999999999996), (-35.85089798717716, 49.99999999999997))
        make_face()
        with Locations((-44.30746668257226, 71.99999999999999)):
            Circle(SKETCH14_R, mode=Mode.SUBTRACT)
        with Locations((-44.307466682572255, 61.99999999999998)):
            Circle(SKETCH14_R, mode=Mode.SUBTRACT)
        with Locations((2.692533317427754, 61.99999999999998)):
            Circle(SKETCH14_R_2, mode=Mode.SUBTRACT)
        with Locations((2.692533317427754, 71.99999999999999)):
            Circle(SKETCH14_R_2, mode=Mode.SUBTRACT)
        with BuildLine():
            Line((-0.3074666825722463, 75.99999999999996), (-0.3074666825722459, 57.99999999999999))
            ThreePointArc((-0.3074666825722459, 57.99999999999999), (-0.8932531201991509, 56.585786437626886), (-2.3074666825722603, 55.99999999999998))
            Line((-2.3074666825722603, 55.99999999999998), (-39.307466682572226, 55.99999999999998))
            ThreePointArc((-39.307466682572226, 55.99999999999998), (-40.72168024494533, 56.585786437626886), (-41.30746668257224, 57.99999999999999))
            Line((-41.30746668257224, 57.99999999999999), (-41.30746668257225, 75.99999999999989))
            ThreePointArc((-41.30746668257225, 75.99999999999989), (-40.721680244945325, 77.41421356237302), (-39.30746668257219, 77.99999999999994))
            Line((-39.30746668257219, 77.99999999999994), (-2.307466682572236, 77.99999999999994))
            ThreePointArc((-2.307466682572236, 77.99999999999994), (-0.893253120199148, 77.41421356237305), (-0.3074666825722463, 75.99999999999996))
        make_face(mode=Mode.SUBTRACT)
    extrude(amount=-BOSS_EXTRUDE7_DEPTH)

    # Fillet1
    fillet1_edges = [part.edges().sort_by_distance(p)[0] for p in [
        (-1.5, 81.49999999999994, 9.192533317427753),
        (-1.5, 81.49999999999994, -45.11453677291794),
    ]]
    fillet(fillet1_edges, radius=FILLET1_R)

    # Sketch16 → Boss-Extrude9 (add)
    with BuildSketch(Plane.ZY.offset(-8).offset(BOSS_EXTRUDE9_START)):
        with Locations(Location((-31.30746668257224, 66.99999999999997, 0), (0, 0, 180))):
            Circle(SKETCH16_R)
    extrude(amount=BOSS_EXTRUDE9_DEPTH)

    # Sketch17 → Boss-Extrude10 (add)
    with BuildSketch(Plane.ZY.offset(-8)):
        with Locations((-31.30746668257224, 66.99999999999997)):
            Circle(SKETCH17_R)
    extrude(amount=BOSS_EXTRUDE10_DEPTH)


solid = part.part
